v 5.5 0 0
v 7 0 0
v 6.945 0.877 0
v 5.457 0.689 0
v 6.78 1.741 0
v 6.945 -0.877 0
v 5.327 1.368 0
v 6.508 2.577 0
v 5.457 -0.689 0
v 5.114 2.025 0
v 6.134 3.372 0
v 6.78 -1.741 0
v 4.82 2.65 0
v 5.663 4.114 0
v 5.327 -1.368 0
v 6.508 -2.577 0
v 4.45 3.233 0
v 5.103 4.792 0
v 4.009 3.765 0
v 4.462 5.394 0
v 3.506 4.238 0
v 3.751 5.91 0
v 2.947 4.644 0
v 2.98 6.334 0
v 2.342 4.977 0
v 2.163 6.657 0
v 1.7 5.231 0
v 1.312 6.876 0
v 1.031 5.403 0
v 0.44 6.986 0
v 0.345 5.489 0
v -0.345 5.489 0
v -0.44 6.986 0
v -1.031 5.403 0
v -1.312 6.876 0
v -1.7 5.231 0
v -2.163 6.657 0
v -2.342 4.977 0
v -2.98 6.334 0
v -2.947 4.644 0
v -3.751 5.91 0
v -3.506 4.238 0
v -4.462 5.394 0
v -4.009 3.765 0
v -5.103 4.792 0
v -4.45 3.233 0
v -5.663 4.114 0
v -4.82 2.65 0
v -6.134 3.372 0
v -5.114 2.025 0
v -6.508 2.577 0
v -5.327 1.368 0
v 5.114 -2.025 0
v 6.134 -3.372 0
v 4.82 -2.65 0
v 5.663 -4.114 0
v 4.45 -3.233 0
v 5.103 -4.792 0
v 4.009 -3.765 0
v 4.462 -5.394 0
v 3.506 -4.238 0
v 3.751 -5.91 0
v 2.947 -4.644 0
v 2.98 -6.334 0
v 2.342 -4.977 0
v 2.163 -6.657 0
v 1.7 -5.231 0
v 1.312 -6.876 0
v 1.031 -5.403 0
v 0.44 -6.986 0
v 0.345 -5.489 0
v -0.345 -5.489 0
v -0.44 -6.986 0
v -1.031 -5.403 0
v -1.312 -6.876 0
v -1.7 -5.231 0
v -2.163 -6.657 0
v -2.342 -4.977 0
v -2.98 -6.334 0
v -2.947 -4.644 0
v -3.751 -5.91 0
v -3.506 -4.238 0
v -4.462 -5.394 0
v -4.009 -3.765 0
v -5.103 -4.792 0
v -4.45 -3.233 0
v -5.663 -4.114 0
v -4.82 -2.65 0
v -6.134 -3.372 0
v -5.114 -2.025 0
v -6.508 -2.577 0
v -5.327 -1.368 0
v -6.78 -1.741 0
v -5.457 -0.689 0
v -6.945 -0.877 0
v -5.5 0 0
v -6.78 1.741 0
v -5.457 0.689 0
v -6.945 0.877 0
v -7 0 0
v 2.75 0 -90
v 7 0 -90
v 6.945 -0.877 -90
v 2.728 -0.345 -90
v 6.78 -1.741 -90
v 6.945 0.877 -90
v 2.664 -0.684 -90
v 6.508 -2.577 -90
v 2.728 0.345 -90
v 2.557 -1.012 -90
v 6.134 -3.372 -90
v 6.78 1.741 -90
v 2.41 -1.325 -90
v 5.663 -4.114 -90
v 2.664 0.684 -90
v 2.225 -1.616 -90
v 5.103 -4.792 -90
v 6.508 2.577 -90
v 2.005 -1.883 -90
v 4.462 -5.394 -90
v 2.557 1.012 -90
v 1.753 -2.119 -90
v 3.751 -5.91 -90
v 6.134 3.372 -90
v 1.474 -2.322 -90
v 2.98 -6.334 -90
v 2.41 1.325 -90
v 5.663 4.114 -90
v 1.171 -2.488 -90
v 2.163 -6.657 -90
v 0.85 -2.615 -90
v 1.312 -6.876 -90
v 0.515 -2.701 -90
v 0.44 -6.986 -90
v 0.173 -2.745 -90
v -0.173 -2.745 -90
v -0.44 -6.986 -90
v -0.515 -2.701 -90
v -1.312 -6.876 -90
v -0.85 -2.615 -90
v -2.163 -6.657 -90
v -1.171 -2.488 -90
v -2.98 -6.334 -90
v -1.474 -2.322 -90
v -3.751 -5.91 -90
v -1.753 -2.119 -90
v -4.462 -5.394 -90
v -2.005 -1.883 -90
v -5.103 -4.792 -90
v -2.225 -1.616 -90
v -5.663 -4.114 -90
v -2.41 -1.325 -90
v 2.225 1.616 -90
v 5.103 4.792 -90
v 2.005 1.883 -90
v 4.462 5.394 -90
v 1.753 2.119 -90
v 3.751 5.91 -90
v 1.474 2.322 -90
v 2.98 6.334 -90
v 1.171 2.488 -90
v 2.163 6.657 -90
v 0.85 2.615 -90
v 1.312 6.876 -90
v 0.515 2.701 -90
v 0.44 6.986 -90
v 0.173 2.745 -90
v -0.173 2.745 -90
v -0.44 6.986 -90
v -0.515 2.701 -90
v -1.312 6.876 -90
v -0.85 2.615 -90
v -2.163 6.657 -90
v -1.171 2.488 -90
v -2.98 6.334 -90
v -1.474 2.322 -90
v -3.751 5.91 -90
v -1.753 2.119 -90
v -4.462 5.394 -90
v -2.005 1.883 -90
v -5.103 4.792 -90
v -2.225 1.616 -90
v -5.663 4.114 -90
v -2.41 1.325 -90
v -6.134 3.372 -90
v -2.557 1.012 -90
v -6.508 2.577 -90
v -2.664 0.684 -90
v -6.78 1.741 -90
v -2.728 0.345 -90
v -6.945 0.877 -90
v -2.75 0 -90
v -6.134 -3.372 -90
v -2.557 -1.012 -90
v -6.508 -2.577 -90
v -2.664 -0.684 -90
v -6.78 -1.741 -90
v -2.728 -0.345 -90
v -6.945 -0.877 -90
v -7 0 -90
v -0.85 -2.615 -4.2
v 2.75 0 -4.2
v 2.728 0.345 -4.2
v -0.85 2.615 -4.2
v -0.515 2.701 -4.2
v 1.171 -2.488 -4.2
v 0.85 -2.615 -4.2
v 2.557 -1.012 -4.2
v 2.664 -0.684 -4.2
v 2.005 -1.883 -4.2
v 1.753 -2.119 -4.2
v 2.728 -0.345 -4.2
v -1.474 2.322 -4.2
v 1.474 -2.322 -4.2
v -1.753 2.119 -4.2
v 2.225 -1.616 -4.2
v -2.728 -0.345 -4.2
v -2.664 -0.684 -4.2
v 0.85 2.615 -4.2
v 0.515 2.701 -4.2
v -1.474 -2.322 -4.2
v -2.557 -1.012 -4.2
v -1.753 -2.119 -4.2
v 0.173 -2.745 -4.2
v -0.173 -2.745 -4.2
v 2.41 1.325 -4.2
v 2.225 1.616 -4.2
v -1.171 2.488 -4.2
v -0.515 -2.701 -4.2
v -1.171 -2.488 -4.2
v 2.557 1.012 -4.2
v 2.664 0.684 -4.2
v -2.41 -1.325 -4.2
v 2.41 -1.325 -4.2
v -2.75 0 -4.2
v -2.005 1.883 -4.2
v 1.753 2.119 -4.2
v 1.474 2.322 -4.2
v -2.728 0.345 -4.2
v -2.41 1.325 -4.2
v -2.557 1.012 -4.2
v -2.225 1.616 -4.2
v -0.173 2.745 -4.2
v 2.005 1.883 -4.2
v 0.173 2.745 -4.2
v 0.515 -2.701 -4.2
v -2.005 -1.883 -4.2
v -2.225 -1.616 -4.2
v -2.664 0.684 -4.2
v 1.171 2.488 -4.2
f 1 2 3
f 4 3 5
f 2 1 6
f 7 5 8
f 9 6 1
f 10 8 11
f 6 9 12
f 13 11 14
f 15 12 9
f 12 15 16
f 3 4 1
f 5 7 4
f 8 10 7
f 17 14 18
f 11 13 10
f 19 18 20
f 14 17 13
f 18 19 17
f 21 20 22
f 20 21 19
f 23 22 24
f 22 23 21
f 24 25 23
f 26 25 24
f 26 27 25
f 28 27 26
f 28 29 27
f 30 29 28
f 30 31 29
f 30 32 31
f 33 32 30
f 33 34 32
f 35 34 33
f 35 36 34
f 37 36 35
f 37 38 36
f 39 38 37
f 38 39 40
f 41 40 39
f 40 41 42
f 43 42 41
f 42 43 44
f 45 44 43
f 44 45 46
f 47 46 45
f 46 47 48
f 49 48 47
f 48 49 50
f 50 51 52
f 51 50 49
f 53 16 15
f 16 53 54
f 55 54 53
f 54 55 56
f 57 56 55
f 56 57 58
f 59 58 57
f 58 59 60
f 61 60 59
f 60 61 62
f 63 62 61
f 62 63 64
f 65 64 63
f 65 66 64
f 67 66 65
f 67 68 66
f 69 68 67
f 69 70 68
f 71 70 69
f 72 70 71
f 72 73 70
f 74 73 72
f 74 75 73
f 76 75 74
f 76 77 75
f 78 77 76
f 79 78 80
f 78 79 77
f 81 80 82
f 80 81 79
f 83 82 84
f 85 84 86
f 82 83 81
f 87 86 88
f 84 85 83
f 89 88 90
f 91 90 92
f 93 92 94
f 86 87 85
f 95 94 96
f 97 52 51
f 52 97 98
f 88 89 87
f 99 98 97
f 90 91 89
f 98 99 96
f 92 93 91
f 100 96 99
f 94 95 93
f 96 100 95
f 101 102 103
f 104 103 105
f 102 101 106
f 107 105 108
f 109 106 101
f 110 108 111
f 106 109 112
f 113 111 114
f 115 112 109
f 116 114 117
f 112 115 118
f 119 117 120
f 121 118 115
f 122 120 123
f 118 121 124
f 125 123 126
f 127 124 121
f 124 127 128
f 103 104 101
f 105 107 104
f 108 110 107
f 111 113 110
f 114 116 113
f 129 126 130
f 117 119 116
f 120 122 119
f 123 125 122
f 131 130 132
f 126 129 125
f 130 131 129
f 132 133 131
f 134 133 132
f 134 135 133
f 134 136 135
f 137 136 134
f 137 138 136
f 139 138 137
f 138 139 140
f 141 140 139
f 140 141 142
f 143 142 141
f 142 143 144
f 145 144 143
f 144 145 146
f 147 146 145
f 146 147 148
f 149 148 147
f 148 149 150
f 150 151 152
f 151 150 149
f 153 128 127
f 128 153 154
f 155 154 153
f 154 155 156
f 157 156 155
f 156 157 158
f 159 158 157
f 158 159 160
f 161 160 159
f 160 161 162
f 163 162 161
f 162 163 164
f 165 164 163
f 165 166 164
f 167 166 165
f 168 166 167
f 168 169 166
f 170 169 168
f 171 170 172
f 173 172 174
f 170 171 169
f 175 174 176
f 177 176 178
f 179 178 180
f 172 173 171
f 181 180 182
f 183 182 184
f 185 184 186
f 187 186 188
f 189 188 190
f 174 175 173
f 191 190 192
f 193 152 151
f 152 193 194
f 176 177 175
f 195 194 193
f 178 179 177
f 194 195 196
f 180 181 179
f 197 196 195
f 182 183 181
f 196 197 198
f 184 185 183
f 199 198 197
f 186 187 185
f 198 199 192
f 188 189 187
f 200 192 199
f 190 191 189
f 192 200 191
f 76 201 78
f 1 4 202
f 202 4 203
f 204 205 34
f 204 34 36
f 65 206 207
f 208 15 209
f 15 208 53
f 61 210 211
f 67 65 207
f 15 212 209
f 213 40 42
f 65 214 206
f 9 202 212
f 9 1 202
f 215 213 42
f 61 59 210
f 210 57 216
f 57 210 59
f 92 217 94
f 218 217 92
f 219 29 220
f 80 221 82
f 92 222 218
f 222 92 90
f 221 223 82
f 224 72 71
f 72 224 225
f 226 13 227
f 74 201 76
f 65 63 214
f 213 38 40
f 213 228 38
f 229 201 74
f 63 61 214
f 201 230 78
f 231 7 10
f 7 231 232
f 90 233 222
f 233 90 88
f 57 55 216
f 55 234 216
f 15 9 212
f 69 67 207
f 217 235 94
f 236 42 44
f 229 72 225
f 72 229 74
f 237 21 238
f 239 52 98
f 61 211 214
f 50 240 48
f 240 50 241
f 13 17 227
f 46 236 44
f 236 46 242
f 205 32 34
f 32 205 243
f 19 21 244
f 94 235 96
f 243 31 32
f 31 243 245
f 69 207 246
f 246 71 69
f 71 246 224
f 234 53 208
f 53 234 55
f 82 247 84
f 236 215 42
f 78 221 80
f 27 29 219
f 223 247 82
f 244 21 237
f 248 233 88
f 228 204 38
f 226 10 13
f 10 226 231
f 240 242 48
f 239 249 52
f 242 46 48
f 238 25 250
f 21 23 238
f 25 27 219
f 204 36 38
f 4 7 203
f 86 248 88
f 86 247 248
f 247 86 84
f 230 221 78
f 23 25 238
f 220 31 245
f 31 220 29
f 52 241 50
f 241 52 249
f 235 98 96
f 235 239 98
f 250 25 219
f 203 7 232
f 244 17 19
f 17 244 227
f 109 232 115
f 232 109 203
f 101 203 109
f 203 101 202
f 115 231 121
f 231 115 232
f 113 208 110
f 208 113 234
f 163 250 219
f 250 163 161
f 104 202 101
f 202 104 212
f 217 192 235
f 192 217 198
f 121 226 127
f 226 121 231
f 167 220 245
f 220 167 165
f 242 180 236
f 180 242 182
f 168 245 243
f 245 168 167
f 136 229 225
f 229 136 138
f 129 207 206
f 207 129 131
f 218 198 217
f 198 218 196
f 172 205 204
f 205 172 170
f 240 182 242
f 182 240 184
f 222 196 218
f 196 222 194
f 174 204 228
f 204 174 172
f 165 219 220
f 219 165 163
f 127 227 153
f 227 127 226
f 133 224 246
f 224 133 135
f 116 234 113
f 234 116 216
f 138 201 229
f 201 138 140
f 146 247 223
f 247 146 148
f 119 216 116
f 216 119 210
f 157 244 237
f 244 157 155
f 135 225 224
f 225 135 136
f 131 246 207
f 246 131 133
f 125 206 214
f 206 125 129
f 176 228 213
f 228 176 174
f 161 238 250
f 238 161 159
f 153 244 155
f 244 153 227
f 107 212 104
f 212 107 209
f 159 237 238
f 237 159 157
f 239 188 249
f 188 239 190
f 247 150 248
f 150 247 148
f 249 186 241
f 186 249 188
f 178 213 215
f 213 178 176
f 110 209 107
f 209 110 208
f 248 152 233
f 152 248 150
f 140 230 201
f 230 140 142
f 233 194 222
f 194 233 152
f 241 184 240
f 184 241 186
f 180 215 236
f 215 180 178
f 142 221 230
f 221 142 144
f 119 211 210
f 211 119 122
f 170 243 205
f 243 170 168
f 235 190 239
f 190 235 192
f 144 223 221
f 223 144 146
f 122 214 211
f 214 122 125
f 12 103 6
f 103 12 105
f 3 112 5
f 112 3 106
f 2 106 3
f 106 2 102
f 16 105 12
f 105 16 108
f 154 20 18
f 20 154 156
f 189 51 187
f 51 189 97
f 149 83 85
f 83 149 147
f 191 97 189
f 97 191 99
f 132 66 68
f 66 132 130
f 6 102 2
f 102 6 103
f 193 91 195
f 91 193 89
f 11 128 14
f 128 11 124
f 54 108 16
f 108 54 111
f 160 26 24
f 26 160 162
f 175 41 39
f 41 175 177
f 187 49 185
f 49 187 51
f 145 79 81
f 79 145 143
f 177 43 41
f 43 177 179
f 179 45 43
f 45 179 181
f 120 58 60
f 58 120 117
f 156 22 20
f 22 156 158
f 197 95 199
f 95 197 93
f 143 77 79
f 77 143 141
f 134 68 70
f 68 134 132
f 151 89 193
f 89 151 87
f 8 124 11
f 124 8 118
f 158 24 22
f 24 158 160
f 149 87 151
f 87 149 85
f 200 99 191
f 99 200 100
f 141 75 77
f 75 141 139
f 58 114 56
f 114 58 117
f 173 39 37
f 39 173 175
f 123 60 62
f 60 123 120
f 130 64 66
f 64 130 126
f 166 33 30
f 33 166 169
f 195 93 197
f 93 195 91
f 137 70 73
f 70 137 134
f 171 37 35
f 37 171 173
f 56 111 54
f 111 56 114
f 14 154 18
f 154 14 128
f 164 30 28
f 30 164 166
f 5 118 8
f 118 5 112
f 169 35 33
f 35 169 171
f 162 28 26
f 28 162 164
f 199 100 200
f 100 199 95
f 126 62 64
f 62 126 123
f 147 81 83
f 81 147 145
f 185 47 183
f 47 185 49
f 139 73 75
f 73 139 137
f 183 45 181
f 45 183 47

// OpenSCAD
$fn = 50;


difference() {
	union() {
		translate(v = [0, 0, -90.0000000000]) {
			cylinder(h = 90, r = 7.0000000000);
		}
		cylinder(h = 0, r = 13.0000000000);
	}
	union() {
		translate(v = [0, 0, 0]) {
			rotate(a = [0, 0, 0]) {
				difference() {
					union() {
						#translate(v = [0, 0, -90.0000000000]) {
							cylinder(h = 90, r = 2.2500000000);
						}
						#translate(v = [0, 0, -4.2000000000]) {
							cylinder(h = 4.2000000000, r = 7.0000000000, r1 = 2.7500000000, r2 = 5.5000000000);
						}
						#translate(v = [0, 0, -90.0000000000]) {
							cylinder(h = 90, r = 2.7500000000);
						}
						#translate(v = [0, 0, -90.0000000000]) {
							cylinder(h = 90, r = 2.2500000000);
						}
					}
					union();
				}
			}
		}
	}
}
